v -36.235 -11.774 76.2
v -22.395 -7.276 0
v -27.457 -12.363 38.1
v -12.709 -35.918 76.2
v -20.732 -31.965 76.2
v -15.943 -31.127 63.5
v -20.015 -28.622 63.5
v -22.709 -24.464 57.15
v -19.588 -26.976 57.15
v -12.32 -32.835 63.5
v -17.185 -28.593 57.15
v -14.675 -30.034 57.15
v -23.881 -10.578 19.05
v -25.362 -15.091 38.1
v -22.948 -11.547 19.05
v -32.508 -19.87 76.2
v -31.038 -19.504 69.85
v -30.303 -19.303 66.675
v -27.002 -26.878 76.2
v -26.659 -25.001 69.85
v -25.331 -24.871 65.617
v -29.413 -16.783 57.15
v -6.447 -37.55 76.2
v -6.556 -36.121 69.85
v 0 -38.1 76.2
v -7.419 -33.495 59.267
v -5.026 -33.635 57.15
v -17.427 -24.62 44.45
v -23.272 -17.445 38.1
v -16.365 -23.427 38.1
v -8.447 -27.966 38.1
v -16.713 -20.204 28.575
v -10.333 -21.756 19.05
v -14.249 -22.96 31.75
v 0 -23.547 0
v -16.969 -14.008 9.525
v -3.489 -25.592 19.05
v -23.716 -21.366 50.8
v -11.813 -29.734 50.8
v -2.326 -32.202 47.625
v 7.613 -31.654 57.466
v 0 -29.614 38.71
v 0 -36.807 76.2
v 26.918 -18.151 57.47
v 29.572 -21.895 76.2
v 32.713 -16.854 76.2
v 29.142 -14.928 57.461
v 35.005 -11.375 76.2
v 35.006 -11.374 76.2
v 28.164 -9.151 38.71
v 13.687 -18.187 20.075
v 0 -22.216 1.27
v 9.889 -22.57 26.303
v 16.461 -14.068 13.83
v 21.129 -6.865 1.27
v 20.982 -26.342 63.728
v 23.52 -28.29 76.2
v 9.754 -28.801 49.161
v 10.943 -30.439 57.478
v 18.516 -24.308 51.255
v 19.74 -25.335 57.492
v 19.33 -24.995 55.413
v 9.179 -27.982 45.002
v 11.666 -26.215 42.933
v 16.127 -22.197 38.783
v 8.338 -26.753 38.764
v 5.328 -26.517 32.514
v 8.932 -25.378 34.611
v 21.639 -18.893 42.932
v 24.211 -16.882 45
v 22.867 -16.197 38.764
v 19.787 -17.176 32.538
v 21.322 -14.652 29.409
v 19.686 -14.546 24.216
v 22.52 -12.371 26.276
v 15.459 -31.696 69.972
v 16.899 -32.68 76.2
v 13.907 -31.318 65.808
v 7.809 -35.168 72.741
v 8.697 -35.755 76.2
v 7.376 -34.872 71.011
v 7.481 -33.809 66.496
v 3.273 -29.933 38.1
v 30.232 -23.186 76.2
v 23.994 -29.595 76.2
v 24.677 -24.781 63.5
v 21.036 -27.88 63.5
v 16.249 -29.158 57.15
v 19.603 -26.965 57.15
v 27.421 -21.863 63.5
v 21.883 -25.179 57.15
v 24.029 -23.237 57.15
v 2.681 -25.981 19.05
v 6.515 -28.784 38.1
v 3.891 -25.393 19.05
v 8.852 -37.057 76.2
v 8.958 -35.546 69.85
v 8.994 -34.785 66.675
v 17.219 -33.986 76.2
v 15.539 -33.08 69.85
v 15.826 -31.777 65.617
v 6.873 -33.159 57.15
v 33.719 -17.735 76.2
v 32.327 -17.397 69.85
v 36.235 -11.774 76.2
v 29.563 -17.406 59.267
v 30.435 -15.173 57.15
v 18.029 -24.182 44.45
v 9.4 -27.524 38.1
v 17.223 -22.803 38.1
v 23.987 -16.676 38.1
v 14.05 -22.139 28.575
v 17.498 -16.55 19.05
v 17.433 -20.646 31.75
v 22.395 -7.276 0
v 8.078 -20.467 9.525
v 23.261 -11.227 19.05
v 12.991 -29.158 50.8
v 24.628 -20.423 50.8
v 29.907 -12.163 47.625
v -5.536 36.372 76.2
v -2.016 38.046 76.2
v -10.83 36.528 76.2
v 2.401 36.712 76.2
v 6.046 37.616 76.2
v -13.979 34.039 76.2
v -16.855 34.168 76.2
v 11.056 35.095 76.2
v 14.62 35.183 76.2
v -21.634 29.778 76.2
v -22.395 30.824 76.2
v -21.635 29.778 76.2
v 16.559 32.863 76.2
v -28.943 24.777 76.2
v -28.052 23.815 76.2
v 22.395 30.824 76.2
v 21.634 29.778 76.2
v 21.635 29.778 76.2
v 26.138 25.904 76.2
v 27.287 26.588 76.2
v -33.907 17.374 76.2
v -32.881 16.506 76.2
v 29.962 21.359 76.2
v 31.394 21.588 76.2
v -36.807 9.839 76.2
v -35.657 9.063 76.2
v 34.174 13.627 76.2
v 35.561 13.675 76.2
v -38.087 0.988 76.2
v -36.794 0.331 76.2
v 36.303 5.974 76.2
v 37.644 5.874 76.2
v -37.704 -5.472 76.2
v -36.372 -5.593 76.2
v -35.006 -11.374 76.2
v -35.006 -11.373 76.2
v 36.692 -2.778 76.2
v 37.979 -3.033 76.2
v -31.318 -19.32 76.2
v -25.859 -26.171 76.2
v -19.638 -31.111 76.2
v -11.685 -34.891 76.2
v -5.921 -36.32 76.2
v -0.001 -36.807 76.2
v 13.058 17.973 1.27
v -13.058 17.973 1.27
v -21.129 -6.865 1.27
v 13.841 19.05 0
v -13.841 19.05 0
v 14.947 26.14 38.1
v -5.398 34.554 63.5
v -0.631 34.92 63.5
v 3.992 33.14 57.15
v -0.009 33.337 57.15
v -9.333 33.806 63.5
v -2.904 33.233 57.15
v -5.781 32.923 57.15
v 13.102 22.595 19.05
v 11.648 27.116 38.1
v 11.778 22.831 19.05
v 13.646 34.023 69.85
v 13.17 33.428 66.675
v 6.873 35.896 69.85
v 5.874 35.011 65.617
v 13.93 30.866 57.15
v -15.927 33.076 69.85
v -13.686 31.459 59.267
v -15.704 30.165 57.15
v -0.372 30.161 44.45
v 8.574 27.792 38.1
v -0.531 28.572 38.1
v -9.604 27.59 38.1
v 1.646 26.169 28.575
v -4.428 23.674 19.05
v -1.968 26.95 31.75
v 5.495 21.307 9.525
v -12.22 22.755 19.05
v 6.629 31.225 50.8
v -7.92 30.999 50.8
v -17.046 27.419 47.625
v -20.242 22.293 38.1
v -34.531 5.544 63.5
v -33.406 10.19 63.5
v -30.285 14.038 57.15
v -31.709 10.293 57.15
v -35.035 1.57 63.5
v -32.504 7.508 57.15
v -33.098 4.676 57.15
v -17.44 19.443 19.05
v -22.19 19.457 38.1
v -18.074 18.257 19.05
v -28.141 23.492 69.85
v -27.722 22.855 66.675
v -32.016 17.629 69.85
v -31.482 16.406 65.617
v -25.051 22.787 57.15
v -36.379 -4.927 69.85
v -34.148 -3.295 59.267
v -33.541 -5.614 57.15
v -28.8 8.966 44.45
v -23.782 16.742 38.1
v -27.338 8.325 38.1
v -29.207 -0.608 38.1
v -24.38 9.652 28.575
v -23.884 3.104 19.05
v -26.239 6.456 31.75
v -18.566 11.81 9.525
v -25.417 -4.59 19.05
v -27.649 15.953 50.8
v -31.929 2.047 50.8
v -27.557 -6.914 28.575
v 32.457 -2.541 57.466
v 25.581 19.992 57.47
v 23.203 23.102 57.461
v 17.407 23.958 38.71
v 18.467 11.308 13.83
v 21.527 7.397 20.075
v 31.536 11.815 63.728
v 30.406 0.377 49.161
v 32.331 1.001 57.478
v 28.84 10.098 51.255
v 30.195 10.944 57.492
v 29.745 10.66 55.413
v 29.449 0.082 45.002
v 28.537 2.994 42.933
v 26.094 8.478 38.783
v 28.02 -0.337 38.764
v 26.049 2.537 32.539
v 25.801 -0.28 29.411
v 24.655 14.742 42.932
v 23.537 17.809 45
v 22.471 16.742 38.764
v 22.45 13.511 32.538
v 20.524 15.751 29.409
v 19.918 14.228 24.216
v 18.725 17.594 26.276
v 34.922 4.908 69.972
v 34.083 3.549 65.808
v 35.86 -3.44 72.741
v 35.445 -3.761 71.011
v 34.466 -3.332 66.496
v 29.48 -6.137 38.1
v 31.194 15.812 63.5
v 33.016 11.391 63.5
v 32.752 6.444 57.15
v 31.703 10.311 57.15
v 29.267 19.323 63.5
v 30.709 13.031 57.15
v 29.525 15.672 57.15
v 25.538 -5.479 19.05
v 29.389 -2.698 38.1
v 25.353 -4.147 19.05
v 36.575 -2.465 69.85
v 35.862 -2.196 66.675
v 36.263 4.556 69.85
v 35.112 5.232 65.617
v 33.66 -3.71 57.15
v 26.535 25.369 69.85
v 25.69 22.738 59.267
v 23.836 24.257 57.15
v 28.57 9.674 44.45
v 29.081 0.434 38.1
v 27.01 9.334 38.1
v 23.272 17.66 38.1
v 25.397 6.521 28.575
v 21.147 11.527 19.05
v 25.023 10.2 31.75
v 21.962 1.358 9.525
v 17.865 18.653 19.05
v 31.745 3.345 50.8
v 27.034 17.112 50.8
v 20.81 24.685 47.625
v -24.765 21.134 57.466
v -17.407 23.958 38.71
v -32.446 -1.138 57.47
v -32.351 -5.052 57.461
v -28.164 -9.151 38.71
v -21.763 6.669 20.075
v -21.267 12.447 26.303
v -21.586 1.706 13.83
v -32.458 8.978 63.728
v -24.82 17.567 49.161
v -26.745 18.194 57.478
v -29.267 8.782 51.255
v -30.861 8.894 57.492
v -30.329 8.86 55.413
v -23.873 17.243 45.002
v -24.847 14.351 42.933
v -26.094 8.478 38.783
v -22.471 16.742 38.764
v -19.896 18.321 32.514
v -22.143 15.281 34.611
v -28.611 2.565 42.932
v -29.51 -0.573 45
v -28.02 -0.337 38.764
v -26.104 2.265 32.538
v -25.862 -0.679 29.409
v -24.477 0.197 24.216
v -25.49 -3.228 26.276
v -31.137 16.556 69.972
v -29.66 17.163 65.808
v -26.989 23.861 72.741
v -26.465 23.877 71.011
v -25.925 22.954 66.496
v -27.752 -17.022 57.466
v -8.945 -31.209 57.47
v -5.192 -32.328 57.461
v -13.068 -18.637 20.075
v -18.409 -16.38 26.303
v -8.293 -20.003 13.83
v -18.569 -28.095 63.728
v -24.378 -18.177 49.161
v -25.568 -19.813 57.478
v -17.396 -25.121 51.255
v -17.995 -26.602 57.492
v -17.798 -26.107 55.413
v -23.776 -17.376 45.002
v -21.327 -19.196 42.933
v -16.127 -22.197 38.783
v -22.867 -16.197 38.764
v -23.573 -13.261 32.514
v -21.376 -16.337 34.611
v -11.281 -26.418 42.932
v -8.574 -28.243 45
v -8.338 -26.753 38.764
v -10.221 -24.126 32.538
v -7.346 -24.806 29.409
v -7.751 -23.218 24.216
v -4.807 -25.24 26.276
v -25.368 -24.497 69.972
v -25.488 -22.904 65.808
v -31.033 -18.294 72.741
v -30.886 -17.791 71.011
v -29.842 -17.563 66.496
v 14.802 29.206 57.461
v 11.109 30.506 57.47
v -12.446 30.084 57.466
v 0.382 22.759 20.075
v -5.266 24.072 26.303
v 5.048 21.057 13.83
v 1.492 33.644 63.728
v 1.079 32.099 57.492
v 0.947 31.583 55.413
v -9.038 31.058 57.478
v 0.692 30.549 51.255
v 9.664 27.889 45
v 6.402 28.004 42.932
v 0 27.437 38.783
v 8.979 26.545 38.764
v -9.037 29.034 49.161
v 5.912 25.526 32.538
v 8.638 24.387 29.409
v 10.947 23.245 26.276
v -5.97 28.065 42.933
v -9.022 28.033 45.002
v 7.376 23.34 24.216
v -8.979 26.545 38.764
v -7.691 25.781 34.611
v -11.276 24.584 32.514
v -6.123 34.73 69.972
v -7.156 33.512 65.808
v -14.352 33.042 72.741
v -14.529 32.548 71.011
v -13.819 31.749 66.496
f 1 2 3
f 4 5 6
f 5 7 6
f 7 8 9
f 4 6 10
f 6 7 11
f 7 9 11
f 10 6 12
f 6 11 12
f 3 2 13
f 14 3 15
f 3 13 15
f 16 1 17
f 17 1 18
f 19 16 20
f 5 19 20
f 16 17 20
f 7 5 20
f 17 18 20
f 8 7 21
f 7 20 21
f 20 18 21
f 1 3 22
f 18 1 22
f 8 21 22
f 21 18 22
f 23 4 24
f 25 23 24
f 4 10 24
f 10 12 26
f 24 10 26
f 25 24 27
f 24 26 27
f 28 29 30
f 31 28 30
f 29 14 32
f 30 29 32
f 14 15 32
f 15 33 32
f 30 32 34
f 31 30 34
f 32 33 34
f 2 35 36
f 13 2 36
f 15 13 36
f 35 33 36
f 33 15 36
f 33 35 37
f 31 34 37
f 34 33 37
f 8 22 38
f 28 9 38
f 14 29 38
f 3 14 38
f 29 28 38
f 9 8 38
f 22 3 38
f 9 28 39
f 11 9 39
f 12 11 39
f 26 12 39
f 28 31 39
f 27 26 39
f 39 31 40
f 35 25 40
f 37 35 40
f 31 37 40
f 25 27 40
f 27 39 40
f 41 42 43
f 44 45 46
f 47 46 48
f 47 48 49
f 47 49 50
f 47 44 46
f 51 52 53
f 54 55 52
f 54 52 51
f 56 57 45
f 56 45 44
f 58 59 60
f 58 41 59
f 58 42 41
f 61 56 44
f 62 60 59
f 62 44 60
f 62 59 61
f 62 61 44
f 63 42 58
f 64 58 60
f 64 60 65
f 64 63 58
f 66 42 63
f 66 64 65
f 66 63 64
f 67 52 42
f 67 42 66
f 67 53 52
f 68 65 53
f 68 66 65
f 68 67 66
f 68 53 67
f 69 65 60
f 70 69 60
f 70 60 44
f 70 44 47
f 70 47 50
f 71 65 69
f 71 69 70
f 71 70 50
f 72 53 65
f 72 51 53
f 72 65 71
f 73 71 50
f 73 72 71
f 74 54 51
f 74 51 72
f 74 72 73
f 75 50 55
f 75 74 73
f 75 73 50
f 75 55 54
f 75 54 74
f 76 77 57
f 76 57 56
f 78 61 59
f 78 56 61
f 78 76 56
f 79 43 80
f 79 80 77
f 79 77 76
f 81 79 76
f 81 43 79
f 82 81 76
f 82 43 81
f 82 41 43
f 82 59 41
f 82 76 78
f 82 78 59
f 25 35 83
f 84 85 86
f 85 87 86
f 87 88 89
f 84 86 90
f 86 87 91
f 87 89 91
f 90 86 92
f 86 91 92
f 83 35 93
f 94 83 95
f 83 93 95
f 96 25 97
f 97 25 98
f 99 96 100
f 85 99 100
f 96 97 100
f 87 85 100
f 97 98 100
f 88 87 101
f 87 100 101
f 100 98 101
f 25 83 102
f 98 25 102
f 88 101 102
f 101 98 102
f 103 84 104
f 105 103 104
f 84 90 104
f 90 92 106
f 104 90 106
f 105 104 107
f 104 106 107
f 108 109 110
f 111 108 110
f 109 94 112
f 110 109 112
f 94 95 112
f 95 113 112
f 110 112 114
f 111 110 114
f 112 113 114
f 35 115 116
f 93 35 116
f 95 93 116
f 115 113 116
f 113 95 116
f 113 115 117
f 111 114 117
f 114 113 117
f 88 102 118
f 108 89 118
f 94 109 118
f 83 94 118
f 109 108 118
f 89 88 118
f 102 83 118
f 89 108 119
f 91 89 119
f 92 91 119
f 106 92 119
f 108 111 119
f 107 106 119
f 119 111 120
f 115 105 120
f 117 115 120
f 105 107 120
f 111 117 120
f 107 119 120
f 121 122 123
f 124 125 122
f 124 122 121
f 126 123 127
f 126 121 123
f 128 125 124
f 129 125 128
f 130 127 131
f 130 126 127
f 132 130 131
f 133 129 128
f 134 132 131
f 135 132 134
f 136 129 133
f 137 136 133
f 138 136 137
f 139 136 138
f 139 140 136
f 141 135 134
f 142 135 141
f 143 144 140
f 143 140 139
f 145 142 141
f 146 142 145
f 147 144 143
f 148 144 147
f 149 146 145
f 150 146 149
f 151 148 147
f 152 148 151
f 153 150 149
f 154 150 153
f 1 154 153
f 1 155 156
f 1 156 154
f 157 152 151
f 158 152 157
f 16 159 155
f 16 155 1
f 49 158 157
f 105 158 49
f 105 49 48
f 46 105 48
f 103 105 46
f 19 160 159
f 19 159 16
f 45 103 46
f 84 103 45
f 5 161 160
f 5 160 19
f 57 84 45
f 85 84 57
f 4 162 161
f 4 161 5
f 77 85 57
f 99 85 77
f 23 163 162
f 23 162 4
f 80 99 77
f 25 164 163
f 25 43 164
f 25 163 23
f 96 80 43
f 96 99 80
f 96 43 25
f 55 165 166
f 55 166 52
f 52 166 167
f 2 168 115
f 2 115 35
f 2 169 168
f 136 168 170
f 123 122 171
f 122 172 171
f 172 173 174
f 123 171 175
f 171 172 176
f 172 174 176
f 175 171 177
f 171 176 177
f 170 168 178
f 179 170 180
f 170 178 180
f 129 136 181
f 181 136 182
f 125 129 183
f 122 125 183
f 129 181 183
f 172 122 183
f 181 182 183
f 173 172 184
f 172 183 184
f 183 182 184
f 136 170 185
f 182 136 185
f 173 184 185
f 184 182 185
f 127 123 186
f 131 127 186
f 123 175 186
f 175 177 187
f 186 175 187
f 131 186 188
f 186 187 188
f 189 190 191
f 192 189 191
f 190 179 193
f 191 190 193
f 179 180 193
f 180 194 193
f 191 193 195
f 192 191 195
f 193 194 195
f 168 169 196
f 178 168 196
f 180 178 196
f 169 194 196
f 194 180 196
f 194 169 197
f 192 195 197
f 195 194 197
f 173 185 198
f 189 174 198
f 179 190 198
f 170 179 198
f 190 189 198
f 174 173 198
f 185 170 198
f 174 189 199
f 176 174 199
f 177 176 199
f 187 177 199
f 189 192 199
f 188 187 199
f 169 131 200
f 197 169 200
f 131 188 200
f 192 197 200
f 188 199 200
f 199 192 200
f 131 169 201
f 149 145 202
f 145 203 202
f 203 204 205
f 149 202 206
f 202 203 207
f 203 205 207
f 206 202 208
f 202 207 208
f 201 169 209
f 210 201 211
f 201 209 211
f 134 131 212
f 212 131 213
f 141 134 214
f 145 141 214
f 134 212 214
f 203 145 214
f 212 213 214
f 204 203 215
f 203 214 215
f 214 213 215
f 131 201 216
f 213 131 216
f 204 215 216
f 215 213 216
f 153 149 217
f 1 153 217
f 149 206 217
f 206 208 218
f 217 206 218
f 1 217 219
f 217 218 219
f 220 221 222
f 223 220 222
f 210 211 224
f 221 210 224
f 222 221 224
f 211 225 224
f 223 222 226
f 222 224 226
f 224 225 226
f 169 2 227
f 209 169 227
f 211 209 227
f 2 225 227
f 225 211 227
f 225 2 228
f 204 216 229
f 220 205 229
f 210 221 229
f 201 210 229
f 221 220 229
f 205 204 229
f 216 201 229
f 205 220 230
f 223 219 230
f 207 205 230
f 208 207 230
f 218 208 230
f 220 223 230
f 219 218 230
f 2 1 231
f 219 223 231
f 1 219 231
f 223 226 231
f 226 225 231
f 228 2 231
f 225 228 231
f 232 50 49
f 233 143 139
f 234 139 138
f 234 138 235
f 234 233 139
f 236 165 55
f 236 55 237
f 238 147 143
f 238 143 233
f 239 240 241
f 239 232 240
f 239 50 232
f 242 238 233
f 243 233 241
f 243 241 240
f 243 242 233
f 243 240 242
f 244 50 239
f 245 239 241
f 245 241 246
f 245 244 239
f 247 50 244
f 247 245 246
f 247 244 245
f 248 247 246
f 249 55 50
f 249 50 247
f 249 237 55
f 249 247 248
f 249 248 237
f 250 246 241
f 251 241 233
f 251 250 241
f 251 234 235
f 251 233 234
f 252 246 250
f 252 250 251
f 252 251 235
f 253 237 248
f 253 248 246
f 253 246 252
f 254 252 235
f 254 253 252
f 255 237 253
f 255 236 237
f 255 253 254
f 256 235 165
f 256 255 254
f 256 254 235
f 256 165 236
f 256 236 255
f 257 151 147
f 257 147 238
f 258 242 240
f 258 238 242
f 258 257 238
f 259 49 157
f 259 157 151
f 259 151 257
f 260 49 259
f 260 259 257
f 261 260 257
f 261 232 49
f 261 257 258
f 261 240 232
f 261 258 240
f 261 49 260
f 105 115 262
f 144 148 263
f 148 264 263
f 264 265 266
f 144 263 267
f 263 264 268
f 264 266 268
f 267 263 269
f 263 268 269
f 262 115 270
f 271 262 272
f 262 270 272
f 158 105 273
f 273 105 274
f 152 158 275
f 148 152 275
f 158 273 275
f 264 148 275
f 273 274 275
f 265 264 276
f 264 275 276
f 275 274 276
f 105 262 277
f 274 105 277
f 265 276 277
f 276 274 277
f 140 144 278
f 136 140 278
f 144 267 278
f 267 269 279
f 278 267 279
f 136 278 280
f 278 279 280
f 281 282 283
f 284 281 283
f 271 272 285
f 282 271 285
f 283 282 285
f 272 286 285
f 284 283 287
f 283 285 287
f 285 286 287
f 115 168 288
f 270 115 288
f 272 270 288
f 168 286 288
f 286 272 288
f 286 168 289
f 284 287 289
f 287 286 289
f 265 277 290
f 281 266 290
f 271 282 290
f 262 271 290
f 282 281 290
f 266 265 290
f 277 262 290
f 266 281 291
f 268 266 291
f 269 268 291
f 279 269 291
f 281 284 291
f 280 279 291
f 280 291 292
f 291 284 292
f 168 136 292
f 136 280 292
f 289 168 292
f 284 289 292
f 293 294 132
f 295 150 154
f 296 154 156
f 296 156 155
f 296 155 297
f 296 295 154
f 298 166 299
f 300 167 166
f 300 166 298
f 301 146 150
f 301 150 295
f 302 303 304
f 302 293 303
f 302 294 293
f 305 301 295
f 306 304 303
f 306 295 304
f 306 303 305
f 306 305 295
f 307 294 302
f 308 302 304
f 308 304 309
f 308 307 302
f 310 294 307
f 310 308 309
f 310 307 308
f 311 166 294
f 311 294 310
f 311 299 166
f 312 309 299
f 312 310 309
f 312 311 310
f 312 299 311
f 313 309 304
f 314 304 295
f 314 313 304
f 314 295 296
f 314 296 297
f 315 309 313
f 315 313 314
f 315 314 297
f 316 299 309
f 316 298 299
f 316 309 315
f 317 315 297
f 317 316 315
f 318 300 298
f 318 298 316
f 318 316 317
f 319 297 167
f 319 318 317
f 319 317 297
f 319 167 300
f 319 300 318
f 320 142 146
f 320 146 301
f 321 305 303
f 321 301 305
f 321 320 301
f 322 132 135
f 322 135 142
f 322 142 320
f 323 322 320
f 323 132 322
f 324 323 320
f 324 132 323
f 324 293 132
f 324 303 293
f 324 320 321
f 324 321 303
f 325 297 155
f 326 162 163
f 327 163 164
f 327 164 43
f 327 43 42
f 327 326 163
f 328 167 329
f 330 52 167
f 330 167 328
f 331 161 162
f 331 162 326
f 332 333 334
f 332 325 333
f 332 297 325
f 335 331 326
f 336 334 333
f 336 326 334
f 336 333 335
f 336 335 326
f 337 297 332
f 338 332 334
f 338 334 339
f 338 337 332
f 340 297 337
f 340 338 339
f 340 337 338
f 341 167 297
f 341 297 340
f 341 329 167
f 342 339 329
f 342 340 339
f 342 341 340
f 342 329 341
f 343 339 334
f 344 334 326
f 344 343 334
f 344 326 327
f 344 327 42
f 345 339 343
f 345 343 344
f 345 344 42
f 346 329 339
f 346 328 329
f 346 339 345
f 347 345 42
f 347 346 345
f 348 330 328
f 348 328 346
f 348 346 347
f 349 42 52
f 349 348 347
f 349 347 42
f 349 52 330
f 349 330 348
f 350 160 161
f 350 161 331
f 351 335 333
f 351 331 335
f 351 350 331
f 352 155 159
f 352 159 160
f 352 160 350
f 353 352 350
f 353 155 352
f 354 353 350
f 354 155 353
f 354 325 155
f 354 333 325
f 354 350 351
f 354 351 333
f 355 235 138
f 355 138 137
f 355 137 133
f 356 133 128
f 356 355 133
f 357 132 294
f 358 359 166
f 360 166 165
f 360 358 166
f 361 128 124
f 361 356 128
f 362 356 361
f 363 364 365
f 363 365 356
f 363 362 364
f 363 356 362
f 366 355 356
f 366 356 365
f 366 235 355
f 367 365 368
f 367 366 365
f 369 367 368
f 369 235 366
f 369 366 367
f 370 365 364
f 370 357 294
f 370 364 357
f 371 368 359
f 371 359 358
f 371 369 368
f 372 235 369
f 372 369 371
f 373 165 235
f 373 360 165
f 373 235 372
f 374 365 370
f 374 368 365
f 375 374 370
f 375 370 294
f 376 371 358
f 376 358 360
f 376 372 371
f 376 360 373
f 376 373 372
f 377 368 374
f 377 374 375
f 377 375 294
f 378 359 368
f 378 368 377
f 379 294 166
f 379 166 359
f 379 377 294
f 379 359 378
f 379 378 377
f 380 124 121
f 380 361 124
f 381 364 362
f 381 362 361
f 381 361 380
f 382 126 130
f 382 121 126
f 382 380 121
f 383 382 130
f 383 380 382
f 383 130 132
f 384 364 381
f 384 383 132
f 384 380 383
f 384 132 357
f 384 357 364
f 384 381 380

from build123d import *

# Parameters (mm, degrees)
F4_T = 1.27


# Not quite as in the source:
# - the arcs of a loft's sections are written as splines that run evenly, so that the points pair up as in the source's solid
# - a shell that OpenCascade refuses in one call is made with other operations: the cavity is built on its own and cut out


with BuildPart() as f3:
    # F2 (on offset) → F3 section 0
    with BuildSketch(Plane.XY.offset(76.2)):
        with BuildLine():
            add(Edge.make_bspline(
                [(22.3946181123, 30.8235474857), (19.1667837677, 33.1687064104), (15.5680943349, 35.0023302613), (7.9790006365, 37.4681762804), (3.9898226701, 38.1), (-3.9898226701, 38.1), (-7.9790006365, 37.4681762804), (-15.5680943349, 35.0023302613), (-19.1667837677, 33.1687064104), (-22.3946181123, 30.8235474857)],
                knots=[0, 0, 0, 0, 0.25, 0.25, 0.5, 0.5, 0.75, 0.75, 1, 1, 1, 1], degree=3))
            add(Edge.make_bspline(
                [(-22.3946181123, 30.8235474857), (-25.622452457, 28.478388561), (-28.478388561, 25.622452457), (-33.1687064104, 19.1667837677), (-35.0023302613, 15.5680943349), (-37.4681762804, 7.9790006365), (-38.1, 3.9898226701), (-38.1, -3.9898226701), (-37.4681762804, -7.9790006365), (-36.2352532708, -11.7735474857)],
                knots=[0, 0, 0, 0, 0.25, 0.25, 0.5, 0.5, 0.75, 0.75, 1, 1, 1, 1], degree=3))
            add(Edge.make_bspline(
                [(-36.2352532708, -11.7735474857), (-35.0023302613, -15.5680943349), (-33.1687064104, -19.1667837677), (-28.478388561, -25.622452457), (-25.622452457, -28.478388561), (-19.1667837677, -33.1687064104), (-15.5680943349, -35.0023302613), (-7.9790006365, -37.4681762804), (-3.9898226701, -38.1), (0, -38.1)],
                knots=[0, 0, 0, 0, 0.25, 0.25, 0.5, 0.5, 0.75, 0.75, 1, 1, 1, 1], degree=3))
            add(Edge.make_bspline(
                [(0, -38.1), (3.9898226701, -38.1), (7.9790006365, -37.4681762804), (15.5680943349, -35.0023302613), (19.1667837677, -33.1687064104), (25.622452457, -28.478388561), (28.478388561, -25.622452457), (33.1687064104, -19.1667837677), (35.0023302613, -15.5680943349), (36.2352532708, -11.7735474857)],
                knots=[0, 0, 0, 0, 0.25, 0.25, 0.5, 0.5, 0.75, 0.75, 1, 1, 1, 1], degree=3))
            add(Edge.make_bspline(
                [(36.2352532708, -11.7735474857), (37.4681762804, -7.9790006365), (38.1, -3.9898226701), (38.1, 3.9898226701), (37.4681762804, 7.9790006365), (35.0023302613, 15.5680943349), (33.1687064104, 19.1667837677), (28.478388561, 25.622452457), (25.622452457, 28.478388561), (22.3946181123, 30.8235474857)],
                knots=[0, 0, 0, 0, 0.25, 0.25, 0.5, 0.5, 0.75, 0.75, 1, 1, 1, 1], degree=3))
        make_face()
    # F0 (on Top) → F3 section 1
    with BuildSketch(Plane.XY):
        Polygon((13.8406351585, 19.05), (-13.8406351585, 19.05), (-22.3946181123, -7.2764525143), (0, -23.5470949714), (22.3946181123, -7.2764525143), align=None)
    loft(ruled=True)

    # F4: shell of thickness 1.27, made by hand


with BuildPart() as f4_core1:
    # F4_t2: copy of F3
    add(f3.part)

    # the walls: a layer under each face that stays
    f4_faces = [f4_core1.faces().sort_by_distance(p)[0] for p in [
        (0, 28.575, 38.1),
        (-27.1764399531, 8.8301606143, 38.1),
        (-16.7959635843, -23.1176606143, 38.1),
        (16.7959635843, -23.1176606143, 38.1),
        (27.1764399531, 8.8301606143, 38.1),
        (-1.3216630512, 1.8191131286, 0),
    ]]
    thicken(f4_faces, amount=-F4_T, mode=Mode.SUBTRACT)


with BuildPart() as f3_1:
    add(f3.part)

    # what is left inside the walls is the cavity
    f4_cavity = [f4_core1.part.solids().sort_by_distance(p)[0] for p in [
        (10.168811, -6.868871, 76.1873),
    ]]
    add(f4_cavity, mode=Mode.SUBTRACT)


solid = f3_1.part
